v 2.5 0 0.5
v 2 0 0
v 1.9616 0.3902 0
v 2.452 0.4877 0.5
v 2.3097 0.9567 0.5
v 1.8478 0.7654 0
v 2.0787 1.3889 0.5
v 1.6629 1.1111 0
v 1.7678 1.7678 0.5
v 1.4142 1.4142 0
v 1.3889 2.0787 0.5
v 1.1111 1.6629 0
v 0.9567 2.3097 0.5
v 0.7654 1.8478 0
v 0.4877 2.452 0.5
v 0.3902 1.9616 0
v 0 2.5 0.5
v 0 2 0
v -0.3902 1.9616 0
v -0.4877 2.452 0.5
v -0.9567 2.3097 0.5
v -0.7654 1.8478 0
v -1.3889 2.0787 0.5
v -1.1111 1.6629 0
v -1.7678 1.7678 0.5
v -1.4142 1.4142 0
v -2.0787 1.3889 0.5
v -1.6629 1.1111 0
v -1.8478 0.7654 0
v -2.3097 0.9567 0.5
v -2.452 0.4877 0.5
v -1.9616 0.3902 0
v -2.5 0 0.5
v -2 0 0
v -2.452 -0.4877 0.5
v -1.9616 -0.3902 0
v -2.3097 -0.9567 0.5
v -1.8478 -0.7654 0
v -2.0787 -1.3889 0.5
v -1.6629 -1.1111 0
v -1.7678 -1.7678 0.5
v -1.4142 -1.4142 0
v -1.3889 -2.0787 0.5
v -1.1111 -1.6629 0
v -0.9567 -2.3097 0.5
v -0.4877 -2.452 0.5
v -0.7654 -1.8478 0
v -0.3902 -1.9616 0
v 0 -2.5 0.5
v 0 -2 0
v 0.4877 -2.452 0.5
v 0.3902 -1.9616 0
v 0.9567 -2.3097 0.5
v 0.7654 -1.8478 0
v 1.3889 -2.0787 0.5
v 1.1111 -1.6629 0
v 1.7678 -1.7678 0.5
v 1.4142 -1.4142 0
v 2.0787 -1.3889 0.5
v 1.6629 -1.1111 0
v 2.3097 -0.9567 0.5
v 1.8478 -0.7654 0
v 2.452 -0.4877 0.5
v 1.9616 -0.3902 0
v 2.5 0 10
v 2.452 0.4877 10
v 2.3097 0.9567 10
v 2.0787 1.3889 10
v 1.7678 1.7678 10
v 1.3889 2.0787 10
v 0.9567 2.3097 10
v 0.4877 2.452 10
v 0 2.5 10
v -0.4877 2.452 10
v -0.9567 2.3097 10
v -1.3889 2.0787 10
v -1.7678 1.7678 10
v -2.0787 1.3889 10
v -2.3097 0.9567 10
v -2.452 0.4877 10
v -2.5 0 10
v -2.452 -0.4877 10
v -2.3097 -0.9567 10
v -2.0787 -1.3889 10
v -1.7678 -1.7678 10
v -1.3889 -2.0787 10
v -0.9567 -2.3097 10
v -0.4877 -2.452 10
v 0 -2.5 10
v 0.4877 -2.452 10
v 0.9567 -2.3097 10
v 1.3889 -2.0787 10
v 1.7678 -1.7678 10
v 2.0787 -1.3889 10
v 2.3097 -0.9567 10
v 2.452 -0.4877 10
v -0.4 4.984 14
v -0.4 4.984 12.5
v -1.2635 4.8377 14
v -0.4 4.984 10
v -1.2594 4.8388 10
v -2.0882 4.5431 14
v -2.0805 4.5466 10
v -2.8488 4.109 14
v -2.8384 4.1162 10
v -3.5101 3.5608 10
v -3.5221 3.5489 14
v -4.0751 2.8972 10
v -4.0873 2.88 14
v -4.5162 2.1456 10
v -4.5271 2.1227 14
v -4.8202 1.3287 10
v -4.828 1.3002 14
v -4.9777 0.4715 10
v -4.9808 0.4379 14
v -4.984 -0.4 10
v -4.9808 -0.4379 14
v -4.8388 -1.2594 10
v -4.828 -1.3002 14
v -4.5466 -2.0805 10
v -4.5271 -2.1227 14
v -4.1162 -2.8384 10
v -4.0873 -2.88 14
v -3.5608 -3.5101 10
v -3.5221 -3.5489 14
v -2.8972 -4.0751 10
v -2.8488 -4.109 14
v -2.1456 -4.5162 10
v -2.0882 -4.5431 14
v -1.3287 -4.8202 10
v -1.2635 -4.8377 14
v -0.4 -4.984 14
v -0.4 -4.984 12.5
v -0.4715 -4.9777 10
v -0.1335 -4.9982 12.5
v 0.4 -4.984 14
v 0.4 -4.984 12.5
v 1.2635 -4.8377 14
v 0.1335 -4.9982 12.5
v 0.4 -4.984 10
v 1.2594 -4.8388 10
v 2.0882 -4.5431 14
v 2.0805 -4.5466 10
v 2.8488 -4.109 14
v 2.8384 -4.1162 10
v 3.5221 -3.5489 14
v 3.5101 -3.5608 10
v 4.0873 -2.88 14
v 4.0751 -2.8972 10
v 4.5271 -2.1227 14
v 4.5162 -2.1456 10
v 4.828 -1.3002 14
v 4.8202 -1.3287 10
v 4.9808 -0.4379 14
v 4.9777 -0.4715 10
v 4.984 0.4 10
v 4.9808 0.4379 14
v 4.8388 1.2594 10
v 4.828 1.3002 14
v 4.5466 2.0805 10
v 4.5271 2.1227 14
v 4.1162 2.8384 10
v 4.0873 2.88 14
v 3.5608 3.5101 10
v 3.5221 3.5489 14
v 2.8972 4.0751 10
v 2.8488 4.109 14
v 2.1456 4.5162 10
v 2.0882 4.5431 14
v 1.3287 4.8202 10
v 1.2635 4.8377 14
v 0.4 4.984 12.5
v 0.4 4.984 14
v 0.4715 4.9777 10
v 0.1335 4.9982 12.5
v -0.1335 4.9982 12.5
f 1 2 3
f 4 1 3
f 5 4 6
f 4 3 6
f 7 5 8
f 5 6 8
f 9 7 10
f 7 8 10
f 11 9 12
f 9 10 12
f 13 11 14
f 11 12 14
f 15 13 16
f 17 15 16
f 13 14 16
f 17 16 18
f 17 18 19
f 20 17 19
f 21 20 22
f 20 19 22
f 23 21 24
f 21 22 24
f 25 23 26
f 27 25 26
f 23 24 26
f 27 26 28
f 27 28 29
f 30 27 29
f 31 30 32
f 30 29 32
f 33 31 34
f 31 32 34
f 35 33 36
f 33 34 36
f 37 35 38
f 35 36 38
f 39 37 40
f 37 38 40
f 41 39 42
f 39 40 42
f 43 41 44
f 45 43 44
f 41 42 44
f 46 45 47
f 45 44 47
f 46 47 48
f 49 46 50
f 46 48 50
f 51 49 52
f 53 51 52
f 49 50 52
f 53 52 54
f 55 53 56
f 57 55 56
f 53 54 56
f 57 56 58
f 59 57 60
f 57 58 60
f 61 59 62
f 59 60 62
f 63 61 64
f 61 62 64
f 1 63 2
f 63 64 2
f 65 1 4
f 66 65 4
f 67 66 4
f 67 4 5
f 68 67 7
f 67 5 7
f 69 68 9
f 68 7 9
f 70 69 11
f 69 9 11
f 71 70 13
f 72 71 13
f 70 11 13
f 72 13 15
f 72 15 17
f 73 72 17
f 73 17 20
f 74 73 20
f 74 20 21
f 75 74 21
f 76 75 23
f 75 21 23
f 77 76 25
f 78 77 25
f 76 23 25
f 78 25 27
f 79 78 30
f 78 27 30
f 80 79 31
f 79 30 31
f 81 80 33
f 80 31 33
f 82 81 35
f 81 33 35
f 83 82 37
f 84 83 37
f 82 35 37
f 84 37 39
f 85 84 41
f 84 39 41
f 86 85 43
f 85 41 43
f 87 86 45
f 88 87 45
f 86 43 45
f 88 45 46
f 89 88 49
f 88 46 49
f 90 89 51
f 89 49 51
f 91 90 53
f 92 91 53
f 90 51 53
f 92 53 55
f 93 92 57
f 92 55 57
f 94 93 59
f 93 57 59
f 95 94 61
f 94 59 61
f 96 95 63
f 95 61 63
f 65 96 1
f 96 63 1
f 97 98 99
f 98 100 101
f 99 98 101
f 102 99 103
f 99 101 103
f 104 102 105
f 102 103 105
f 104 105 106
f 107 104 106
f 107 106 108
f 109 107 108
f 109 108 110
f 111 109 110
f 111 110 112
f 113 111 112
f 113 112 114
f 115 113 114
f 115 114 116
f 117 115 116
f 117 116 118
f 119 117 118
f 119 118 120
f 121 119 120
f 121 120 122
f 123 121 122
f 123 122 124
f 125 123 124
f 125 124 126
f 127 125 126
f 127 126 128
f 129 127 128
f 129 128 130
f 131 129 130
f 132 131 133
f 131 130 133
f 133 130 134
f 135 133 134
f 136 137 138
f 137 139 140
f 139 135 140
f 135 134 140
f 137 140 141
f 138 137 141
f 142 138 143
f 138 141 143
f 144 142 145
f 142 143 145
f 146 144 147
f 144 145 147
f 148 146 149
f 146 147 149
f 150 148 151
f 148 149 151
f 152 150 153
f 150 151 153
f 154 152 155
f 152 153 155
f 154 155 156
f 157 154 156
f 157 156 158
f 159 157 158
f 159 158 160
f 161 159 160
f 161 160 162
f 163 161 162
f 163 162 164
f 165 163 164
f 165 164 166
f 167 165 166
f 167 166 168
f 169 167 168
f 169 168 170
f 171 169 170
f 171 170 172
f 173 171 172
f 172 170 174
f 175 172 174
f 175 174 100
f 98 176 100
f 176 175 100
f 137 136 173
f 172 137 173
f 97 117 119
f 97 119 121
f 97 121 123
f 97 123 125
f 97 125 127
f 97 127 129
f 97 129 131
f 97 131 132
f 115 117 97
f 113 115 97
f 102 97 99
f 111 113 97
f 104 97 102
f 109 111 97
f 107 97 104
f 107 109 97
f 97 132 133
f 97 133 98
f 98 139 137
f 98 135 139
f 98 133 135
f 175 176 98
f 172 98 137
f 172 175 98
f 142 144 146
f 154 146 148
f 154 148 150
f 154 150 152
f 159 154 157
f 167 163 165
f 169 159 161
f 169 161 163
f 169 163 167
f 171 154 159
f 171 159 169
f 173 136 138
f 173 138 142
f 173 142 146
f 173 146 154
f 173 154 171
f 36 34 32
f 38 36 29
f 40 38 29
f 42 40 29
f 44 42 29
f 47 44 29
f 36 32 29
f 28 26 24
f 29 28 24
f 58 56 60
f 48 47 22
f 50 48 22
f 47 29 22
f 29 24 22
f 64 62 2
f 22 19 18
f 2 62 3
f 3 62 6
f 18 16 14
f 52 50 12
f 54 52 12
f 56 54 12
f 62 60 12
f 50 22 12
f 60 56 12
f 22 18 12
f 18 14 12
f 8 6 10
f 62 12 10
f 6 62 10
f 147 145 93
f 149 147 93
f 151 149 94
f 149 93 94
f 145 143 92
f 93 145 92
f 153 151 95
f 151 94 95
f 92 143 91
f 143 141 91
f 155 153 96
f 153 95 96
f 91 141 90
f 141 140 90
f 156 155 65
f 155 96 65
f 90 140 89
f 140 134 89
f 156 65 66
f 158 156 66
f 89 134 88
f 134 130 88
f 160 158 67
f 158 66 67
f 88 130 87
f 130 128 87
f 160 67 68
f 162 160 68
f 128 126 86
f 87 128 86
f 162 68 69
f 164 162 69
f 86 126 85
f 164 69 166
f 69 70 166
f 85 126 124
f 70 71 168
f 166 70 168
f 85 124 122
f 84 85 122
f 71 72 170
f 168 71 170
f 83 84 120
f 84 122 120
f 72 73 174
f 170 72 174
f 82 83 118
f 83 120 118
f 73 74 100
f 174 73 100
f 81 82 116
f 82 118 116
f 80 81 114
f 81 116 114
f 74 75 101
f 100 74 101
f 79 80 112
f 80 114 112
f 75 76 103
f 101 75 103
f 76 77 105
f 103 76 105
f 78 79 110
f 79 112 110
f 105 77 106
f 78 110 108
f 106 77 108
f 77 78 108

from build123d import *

# Parameters (mm, degrees)
SKETCH_1_R          = 2.5
EXTRUDE_1_DEPTH     = 10
SKETCH_2_R          = 5
EXTRUDE_2_DEPTH     = 4
SKETCH_3_W          = 0.8
SKETCH_3_H          = 11.405632212
CUT_EXTRUDE_1_DEPTH = 1.5
CHAMFER_1_SIZE      = 0.5


with BuildPart() as part:
    # Эскиз1 → Вытянуть1 (new body)
    with BuildSketch(Plane.XY):
        Circle(SKETCH_1_R)
    extrude(amount=EXTRUDE_1_DEPTH)

    # Эскиз2 → Вытянуть2 (add)
    with BuildSketch(Plane.XY.offset(10)):
        with Locations(Location((0, 0, 0), (0, 0, 94.588565736))):
            Circle(SKETCH_2_R)
    extrude(amount=EXTRUDE_2_DEPTH)

    # Эскиз3 → Вырез-Вытянуть1 (cut)
    with BuildSketch(Plane.XY.offset(14)):
        with Locations((0, 0.088759784)):
            Rectangle(SKETCH_3_W, SKETCH_3_H)
    extrude(amount=-CUT_EXTRUDE_1_DEPTH, mode=Mode.SUBTRACT)

    # Фаска1
    chamfer_1_edges = [part.edges().sort_by_distance(p)[0] for p in [
        (-2.5, 0, 0),
    ]]
    chamfer(chamfer_1_edges, length=CHAMFER_1_SIZE)


solid = part.part
